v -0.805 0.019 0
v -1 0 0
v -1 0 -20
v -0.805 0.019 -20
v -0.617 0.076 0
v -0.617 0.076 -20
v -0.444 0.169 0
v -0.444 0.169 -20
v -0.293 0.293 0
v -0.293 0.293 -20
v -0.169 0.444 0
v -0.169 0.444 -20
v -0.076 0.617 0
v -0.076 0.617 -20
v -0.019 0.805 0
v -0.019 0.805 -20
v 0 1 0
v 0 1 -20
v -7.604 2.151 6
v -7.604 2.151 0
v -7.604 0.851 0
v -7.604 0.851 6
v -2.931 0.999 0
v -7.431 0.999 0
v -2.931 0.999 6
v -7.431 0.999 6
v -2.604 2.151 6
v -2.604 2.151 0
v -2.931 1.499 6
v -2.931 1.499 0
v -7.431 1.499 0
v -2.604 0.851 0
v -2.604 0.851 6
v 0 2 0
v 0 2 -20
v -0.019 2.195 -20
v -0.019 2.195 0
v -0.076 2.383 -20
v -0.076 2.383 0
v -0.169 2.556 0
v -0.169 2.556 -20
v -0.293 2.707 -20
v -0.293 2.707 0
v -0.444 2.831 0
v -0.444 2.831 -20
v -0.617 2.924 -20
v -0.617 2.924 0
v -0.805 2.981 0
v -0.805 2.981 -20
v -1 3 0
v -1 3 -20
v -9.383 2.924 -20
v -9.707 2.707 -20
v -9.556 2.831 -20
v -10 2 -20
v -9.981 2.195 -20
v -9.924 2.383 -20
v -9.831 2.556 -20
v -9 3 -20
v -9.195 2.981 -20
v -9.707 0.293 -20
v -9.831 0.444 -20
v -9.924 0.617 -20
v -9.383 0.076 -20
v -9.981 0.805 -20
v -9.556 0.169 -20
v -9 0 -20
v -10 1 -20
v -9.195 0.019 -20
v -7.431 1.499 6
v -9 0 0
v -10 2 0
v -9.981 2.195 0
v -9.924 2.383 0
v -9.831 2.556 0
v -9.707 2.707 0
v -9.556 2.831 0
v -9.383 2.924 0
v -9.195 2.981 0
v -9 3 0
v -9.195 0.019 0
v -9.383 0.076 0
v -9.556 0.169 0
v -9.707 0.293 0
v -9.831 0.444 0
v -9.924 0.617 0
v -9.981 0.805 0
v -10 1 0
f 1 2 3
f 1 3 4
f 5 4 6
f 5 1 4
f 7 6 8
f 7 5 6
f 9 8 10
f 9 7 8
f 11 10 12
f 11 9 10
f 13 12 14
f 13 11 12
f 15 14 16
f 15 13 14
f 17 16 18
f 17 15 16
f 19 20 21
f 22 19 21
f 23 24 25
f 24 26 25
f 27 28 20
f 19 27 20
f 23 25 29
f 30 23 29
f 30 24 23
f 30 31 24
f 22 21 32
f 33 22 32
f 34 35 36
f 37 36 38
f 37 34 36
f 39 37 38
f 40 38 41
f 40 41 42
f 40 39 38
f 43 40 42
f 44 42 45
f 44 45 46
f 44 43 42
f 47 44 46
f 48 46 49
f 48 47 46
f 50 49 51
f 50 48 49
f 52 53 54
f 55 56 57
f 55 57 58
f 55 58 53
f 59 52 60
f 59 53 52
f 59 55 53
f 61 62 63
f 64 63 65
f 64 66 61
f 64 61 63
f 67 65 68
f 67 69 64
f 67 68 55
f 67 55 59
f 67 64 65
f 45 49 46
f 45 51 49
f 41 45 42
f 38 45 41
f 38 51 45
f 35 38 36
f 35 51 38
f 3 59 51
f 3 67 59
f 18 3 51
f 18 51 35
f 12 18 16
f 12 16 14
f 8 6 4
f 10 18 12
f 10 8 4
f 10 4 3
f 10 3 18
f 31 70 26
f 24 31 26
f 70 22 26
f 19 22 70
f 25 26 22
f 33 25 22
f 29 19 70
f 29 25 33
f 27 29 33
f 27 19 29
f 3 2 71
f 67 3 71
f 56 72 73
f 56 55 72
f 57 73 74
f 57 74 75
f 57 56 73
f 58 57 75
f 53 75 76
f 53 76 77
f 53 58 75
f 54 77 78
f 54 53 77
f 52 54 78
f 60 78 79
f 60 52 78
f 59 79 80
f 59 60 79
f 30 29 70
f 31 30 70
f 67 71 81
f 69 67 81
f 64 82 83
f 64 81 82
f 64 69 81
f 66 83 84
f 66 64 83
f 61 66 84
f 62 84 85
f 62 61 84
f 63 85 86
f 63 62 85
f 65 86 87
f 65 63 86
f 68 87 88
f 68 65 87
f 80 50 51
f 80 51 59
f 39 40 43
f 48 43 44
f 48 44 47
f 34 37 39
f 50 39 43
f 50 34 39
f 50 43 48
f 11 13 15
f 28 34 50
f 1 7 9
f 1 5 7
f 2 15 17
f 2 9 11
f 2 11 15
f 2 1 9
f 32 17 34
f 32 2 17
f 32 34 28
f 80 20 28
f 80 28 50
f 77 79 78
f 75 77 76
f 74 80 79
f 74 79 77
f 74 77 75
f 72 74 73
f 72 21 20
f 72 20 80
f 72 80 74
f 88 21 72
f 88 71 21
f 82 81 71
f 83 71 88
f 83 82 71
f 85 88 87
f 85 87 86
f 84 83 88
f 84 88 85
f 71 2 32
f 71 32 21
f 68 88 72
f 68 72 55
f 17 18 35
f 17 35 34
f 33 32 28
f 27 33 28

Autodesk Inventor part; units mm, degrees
ref_plane "YZ Plane" through (0, 0, 0) normal (1, 0, 0) x (0, 1, 0)
ref_plane "XZ Plane" through (0, 0, 0) normal (0, 1, 0) x (-1, 0, 0)
ref_plane "XY Plane" through (0, 0, 0) normal (0, 0, 1) x (1, 0, 0)
sketch "草圖2" plane through (0, 0, 0) normal (0, 1, 0) x (-1, 0, 0)
  line L0 (0, 0) -> (10, 0)
  line L1 (10, 0) -> (10, -20)
  line L2 (10, -20) -> (0, -20)
  line L3 (0, -20) -> (0, 0)
  dimension "d1" = 10
  dimension "d2" = 20
extrude "擠出1" add sketch "草圖2" along normal blind 3
fillet "圓角1" radius 1 4 edges at (-10, 3, -10) (0, 3, -10) (0, 0, -10) (-10, 0, -10)
sketch "草圖3" plane through (-9, 0, 0) normal (0, 0, 1) x (1, 0, 0)
  line L0 (1.3959, 0.8511) -> (6.3959, 0.8511)
  line L1 (6.3959, 0.8511) -> (6.3959, 2.1511)
  line L2 (6.3959, 2.1511) -> (1.3959, 2.1511)
  line L3 (1.3959, 2.1511) -> (1.3959, 0.8511)
  point P0 (9, 0)
  dimension "d6" = 5
  dimension "d7" = 1.3
extrude "擠出2" add sketch "草圖3" along normal blind 6
sketch "草圖4" plane through (-9, 0, 6) normal (0, 0, 1) x (1, 0, 0)
  line L0 (6.0686, 1.499) -> (1.5686, 1.499)
  line L1 (1.5686, 1.499) -> (1.5686, 0.999)
  line L2 (1.5686, 0.999) -> (6.0686, 0.999)
  line L3 (6.0686, 0.999) -> (6.0686, 1.499)
  line L4 (4.9801, 1.499) -> (4.9403, 1.499)
  point P0 (9, 0)
  dimension "d12" = 4.5
  dimension "d13" = 0.5
extrude "擠出3" cut sketch "草圖4" against normal blind 6
properties part number "USB"
